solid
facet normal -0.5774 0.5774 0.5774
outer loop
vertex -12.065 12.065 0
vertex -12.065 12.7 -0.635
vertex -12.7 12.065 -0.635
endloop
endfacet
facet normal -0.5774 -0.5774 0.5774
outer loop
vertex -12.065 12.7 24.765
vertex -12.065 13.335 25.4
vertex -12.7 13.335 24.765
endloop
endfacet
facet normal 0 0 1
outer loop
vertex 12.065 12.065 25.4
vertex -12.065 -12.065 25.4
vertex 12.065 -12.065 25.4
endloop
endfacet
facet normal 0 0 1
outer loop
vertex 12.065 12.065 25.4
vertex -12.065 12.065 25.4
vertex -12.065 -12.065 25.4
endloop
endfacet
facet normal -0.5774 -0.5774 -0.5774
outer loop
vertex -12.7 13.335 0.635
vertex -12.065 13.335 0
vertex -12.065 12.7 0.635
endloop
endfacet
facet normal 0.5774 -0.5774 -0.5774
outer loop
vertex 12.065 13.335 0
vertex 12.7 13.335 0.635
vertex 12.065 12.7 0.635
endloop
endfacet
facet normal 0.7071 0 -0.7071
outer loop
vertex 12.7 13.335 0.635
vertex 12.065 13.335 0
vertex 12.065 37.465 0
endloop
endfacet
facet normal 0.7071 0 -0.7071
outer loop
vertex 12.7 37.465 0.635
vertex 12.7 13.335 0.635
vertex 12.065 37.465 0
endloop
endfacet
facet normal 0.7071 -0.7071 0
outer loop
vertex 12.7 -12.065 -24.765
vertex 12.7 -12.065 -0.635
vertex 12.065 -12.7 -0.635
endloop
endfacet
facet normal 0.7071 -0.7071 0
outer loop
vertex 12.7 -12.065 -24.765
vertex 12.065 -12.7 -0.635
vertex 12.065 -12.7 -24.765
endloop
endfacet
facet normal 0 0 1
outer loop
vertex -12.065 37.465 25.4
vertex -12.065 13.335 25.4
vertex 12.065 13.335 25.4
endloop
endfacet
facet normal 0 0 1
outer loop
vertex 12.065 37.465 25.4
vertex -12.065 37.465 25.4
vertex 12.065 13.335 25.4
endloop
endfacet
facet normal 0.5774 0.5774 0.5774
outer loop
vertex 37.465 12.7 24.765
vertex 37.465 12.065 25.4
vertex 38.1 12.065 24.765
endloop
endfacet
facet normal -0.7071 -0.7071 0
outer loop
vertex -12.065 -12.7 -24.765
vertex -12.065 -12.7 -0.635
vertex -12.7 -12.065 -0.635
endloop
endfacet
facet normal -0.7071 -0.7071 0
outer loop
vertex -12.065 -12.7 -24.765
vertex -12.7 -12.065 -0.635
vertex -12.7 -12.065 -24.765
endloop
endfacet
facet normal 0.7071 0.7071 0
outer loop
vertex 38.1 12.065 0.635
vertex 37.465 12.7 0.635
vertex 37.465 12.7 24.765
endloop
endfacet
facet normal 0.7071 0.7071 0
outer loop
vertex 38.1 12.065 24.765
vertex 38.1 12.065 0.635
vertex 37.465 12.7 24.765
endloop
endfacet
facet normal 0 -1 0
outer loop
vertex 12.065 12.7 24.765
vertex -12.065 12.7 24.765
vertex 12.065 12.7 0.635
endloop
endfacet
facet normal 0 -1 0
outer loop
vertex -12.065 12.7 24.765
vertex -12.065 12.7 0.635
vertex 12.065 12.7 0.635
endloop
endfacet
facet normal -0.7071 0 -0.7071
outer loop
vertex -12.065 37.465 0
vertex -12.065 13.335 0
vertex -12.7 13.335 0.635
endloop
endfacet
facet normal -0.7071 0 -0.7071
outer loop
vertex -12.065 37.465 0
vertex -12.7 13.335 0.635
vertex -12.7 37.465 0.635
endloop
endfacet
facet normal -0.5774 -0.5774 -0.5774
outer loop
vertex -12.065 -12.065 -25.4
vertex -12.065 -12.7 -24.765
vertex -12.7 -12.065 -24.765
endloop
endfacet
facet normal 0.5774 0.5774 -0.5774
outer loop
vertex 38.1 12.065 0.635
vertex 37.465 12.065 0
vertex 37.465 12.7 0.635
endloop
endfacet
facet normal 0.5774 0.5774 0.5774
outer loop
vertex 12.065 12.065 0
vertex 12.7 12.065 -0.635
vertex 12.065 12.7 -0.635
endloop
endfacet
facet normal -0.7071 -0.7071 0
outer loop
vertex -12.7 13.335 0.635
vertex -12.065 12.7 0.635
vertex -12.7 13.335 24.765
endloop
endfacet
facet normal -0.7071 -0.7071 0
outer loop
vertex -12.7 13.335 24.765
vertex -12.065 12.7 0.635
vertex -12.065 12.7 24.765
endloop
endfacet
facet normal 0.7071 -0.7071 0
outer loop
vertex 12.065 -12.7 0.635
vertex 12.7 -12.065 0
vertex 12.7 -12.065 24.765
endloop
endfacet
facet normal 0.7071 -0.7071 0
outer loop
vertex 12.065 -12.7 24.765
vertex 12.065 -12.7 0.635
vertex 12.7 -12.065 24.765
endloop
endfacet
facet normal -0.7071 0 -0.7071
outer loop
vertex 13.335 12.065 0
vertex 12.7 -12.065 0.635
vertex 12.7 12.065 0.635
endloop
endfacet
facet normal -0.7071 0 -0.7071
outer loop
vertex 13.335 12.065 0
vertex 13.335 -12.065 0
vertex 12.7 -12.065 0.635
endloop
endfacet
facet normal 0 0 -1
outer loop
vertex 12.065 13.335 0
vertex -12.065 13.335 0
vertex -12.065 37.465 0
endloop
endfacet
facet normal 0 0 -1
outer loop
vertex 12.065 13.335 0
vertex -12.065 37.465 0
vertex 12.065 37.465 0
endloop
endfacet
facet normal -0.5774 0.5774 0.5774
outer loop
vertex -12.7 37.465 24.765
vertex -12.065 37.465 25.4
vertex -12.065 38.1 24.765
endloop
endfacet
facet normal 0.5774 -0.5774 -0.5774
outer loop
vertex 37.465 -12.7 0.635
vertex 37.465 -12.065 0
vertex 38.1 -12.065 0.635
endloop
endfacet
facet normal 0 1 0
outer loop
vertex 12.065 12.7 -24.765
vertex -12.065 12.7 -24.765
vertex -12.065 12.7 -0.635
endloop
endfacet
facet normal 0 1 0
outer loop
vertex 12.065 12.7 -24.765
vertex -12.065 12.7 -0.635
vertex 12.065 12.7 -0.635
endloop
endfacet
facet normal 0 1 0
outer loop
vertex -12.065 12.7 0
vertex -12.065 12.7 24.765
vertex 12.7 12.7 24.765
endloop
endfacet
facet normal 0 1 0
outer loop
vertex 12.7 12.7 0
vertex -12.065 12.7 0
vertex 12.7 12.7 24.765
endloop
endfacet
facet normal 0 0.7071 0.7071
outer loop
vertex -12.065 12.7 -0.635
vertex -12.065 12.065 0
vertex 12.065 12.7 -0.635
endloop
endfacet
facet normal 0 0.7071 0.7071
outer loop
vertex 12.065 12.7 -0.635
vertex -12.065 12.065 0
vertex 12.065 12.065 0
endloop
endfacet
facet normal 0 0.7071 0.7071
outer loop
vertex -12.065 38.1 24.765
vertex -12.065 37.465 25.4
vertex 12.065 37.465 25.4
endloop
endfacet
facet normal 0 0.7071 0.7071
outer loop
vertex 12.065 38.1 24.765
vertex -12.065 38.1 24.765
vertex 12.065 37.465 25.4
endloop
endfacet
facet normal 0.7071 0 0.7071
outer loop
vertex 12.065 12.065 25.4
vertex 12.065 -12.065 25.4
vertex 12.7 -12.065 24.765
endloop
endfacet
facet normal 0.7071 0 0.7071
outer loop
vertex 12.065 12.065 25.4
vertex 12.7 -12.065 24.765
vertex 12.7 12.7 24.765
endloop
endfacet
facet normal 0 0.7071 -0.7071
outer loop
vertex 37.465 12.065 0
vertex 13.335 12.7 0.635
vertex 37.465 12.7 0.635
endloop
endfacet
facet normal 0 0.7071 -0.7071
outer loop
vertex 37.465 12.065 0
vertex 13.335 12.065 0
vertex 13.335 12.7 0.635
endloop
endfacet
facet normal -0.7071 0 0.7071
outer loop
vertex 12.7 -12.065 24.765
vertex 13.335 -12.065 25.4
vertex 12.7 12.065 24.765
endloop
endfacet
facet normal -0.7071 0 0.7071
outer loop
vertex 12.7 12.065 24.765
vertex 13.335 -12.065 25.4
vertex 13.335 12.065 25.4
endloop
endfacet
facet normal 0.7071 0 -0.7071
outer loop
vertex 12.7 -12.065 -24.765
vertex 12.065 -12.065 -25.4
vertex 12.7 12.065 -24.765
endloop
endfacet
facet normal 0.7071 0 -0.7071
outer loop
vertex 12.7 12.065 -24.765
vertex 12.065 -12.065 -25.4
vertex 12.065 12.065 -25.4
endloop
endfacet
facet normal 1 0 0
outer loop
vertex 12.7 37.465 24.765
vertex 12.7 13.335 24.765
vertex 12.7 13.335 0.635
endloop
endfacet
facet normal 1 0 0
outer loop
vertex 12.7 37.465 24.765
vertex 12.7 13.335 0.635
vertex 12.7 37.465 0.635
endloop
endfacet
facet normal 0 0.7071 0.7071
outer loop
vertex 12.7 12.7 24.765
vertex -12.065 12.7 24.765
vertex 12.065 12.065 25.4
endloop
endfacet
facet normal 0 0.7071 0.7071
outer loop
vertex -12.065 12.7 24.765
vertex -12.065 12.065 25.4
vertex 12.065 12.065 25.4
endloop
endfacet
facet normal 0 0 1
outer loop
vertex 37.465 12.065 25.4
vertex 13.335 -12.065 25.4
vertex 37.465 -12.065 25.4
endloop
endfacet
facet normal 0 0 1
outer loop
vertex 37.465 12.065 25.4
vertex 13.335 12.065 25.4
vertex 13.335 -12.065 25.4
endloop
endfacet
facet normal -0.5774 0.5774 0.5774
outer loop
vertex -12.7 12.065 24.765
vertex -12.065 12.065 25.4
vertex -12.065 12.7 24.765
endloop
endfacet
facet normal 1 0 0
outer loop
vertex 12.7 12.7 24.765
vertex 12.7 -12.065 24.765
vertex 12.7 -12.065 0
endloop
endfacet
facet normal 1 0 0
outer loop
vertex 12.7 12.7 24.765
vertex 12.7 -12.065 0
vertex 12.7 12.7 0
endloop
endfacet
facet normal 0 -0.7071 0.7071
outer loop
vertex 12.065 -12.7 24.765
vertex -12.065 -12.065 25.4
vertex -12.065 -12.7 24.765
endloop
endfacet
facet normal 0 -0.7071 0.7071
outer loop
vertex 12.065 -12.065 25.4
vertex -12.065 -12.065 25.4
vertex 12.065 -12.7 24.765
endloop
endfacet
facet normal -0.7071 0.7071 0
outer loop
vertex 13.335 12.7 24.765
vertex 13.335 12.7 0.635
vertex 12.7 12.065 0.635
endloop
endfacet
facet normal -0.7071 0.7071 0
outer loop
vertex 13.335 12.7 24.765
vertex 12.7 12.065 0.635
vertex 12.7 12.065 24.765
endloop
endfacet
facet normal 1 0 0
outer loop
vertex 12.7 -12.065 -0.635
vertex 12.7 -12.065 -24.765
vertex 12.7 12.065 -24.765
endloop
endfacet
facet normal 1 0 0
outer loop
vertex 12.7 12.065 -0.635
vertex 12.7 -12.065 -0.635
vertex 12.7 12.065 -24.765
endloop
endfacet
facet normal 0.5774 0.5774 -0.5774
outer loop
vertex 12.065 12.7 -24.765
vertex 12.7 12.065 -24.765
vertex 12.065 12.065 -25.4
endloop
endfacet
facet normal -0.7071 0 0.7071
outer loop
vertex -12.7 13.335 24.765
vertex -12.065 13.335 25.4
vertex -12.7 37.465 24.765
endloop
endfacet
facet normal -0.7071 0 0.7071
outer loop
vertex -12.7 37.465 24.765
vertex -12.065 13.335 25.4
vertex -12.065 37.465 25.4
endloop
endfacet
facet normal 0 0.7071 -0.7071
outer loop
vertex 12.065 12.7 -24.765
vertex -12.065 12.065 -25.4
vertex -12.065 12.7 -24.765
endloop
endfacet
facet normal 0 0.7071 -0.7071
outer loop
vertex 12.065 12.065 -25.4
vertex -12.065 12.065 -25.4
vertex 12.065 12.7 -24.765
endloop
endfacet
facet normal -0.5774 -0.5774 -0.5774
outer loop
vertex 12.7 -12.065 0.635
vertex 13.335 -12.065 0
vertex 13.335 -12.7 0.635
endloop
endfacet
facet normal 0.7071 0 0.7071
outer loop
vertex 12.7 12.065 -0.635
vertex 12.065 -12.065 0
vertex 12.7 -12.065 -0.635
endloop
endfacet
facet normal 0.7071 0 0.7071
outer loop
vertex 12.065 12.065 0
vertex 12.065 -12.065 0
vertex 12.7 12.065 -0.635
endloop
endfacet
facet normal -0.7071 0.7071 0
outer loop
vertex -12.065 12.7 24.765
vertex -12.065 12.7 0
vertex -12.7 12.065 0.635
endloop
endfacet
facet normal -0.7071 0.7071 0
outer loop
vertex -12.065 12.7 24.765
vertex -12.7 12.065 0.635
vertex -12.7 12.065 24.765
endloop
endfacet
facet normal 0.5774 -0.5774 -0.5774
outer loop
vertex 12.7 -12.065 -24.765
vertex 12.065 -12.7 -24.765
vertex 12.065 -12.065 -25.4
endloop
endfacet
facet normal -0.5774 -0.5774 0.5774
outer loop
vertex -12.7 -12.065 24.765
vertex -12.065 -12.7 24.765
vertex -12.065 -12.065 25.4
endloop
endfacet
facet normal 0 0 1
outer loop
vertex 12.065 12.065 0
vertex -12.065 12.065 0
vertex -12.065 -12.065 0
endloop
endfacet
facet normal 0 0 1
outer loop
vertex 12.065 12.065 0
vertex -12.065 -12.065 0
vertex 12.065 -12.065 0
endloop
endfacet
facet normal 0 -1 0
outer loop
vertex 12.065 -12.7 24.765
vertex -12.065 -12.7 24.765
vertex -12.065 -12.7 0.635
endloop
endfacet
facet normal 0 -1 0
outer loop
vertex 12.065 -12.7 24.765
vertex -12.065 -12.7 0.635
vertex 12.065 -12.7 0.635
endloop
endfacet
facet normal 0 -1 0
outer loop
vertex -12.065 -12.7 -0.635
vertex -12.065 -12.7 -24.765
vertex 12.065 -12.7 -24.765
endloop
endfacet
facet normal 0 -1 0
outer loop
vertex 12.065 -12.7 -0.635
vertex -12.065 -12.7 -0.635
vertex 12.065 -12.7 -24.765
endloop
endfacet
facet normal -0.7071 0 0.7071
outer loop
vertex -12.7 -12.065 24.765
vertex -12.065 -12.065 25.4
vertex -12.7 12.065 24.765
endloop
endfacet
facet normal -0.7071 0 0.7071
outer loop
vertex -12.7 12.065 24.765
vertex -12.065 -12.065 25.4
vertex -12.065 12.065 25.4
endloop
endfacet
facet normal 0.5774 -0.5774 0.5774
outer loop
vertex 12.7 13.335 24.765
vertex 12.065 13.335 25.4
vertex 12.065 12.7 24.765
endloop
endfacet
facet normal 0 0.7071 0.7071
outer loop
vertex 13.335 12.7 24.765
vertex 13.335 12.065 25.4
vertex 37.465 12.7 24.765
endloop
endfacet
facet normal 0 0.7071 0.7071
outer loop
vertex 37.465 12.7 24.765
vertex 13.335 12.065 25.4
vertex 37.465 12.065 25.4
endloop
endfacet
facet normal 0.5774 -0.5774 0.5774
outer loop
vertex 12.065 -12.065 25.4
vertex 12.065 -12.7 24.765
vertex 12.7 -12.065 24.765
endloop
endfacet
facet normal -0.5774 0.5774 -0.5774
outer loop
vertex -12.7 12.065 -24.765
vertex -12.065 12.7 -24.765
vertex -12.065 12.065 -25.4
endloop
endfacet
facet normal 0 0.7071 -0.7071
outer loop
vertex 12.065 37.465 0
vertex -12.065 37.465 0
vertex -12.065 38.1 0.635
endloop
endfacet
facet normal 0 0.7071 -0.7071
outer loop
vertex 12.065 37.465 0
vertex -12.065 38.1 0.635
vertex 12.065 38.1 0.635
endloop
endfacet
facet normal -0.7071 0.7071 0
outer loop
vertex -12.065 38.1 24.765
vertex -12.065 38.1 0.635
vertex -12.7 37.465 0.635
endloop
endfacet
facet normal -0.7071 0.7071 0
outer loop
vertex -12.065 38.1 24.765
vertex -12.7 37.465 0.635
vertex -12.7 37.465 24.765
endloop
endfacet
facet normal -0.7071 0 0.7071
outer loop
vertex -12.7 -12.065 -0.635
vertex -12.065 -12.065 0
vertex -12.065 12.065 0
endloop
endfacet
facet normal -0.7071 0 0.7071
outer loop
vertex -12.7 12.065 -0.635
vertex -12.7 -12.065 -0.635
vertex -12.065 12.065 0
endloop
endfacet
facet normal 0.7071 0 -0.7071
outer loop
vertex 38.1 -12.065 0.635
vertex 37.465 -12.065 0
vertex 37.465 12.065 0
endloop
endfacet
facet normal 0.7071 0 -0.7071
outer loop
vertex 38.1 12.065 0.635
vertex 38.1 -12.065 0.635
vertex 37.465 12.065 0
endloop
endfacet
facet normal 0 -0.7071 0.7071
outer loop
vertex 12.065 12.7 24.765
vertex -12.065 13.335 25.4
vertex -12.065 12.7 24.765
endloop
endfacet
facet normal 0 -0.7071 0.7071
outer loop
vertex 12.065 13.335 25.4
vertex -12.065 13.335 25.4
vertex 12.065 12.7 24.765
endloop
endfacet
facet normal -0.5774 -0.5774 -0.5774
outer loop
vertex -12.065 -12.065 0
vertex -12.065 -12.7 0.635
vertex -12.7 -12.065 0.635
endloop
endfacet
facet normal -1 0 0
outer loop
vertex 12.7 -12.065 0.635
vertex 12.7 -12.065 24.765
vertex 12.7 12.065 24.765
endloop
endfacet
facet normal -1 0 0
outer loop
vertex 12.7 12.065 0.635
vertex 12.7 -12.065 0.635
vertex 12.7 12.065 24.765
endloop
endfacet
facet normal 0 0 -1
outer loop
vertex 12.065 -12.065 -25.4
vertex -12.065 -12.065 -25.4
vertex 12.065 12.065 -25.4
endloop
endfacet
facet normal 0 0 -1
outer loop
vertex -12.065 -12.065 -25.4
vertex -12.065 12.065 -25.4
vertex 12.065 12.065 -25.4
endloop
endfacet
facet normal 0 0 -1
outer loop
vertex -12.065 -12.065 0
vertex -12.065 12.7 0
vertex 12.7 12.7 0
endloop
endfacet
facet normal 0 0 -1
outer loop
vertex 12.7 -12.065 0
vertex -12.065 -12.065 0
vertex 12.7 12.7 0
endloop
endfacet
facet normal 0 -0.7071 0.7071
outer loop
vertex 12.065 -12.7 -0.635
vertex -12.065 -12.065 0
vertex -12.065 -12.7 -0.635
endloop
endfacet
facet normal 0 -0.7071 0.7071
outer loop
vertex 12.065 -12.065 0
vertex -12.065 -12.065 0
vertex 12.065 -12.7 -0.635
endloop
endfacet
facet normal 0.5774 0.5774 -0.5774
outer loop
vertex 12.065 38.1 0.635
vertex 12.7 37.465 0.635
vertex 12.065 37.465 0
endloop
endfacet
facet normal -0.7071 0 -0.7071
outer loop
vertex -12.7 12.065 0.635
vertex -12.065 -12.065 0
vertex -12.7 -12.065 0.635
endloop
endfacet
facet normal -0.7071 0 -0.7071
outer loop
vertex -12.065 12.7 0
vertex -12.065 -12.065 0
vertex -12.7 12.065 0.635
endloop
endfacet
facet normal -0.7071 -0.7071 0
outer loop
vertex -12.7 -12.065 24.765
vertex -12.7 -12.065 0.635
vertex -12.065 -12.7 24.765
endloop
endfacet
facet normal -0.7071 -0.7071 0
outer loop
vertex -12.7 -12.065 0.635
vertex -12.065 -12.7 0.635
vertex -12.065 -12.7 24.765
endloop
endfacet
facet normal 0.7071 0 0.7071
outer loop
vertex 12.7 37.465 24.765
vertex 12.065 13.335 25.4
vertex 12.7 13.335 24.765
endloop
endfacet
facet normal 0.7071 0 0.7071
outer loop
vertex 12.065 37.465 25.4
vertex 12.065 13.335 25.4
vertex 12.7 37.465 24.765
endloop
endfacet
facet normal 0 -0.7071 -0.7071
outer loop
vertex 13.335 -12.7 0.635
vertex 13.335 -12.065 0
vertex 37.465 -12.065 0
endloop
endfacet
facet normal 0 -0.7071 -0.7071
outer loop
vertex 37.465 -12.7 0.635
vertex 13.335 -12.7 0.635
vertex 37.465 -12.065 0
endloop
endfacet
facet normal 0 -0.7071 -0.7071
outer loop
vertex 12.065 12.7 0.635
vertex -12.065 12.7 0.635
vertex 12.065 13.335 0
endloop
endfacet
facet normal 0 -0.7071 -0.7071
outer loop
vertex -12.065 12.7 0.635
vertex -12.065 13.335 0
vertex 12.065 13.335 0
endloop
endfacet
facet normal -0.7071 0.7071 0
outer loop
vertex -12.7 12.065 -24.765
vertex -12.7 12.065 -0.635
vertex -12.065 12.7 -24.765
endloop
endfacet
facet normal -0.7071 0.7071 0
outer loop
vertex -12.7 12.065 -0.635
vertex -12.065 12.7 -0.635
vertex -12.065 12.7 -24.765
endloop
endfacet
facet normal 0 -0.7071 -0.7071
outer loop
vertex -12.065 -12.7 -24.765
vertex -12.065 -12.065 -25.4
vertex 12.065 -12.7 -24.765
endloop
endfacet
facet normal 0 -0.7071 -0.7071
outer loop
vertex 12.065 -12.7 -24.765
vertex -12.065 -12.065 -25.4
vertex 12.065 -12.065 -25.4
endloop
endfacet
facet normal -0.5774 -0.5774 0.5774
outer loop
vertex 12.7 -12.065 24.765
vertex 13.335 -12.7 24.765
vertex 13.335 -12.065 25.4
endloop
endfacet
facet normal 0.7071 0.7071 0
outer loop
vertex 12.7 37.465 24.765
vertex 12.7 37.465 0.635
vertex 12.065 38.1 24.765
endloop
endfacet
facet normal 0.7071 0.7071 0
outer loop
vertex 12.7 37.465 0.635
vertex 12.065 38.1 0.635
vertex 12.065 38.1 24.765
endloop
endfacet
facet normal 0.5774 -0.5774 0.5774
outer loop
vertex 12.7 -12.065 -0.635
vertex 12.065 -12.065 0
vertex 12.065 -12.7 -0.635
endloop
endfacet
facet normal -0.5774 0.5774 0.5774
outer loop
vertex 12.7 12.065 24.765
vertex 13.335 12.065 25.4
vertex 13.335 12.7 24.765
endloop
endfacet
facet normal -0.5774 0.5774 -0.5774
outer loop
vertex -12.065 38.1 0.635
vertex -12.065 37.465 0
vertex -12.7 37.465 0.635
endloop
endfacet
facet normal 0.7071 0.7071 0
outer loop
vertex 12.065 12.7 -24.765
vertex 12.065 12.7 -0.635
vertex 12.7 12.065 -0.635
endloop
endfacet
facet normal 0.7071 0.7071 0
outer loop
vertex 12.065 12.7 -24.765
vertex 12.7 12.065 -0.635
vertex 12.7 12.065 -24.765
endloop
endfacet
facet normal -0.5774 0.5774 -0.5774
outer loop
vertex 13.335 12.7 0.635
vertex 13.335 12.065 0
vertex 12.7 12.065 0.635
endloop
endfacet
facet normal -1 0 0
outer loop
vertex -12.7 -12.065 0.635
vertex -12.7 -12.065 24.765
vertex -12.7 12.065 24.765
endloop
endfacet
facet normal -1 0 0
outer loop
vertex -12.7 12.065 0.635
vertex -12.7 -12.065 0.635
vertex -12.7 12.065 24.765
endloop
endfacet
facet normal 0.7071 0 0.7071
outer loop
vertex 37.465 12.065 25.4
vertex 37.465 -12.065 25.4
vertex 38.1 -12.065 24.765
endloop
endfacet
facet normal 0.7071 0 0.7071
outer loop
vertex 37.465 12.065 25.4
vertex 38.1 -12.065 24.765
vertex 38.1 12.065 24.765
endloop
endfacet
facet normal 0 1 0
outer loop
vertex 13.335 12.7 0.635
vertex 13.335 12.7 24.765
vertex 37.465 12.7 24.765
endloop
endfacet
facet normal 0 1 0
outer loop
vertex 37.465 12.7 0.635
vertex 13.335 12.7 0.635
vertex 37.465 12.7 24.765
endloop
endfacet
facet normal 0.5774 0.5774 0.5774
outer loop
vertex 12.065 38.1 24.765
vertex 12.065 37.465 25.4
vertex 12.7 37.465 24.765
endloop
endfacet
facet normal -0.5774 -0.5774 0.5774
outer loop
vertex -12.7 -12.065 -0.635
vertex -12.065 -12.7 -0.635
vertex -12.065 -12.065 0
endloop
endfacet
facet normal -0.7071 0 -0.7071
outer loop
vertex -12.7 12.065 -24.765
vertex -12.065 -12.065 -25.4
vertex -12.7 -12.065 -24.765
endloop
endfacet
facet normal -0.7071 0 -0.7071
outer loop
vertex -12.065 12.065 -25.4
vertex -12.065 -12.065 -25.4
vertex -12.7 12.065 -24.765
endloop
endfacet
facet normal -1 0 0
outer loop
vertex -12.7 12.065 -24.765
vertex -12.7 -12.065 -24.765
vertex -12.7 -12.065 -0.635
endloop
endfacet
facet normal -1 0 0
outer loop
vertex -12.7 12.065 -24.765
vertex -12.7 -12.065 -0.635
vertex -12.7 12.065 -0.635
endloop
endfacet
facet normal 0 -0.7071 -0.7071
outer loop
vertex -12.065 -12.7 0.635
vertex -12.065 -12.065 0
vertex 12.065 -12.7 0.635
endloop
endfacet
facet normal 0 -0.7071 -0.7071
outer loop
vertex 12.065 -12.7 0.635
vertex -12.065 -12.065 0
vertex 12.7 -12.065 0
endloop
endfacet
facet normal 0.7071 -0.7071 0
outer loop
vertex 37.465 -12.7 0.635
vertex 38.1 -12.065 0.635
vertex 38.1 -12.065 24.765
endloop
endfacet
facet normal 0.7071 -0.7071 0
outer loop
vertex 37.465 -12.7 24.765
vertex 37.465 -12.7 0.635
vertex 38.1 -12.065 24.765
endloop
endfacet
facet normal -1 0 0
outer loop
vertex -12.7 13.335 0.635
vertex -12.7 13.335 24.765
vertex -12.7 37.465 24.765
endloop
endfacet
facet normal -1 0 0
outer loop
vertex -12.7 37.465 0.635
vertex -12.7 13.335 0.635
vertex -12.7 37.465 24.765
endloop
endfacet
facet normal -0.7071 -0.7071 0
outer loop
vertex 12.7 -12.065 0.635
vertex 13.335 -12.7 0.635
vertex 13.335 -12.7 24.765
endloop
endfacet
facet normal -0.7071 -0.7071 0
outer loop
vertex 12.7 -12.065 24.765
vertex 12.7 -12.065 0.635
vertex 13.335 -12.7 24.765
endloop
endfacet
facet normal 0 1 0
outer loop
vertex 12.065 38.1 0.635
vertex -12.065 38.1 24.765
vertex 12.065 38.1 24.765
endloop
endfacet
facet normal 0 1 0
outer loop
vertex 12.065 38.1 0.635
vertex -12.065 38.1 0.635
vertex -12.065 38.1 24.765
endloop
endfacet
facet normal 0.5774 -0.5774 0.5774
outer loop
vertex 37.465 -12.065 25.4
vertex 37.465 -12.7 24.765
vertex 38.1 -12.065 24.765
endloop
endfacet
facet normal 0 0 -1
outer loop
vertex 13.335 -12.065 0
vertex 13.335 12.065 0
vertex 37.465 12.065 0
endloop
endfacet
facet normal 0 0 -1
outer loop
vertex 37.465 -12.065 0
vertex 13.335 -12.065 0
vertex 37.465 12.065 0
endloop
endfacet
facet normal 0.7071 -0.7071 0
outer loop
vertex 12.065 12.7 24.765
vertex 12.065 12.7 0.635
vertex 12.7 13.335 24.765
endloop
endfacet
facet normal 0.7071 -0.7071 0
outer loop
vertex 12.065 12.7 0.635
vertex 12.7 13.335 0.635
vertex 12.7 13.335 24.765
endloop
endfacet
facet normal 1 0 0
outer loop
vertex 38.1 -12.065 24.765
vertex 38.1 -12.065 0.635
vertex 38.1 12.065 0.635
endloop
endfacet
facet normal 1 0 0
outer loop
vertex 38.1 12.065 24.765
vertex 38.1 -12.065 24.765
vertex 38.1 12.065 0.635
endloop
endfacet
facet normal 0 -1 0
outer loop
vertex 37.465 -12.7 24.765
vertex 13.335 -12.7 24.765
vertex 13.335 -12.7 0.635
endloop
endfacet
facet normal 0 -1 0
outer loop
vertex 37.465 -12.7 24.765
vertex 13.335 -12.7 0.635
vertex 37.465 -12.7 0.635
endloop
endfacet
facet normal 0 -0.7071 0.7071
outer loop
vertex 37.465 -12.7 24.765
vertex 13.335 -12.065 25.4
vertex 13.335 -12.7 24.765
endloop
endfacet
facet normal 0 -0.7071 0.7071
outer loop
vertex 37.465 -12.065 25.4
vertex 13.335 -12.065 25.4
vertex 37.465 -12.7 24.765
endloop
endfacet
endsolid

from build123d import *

# Parameters (mm, degrees)
F0_W      = 25.4
F0_H      = 25.4
F1_DEPTH  = 25.4
F2_DEPTH  = 25.4
F3_DEPTH  = 25.4
F4_DEPTH  = 25.4
F5_SIZE   = 0.635
F5_2_SIZE = 0.635
F5_3_SIZE = 0.635
F5_4_SIZE = 0.635


with BuildPart() as f1:
    # F0 (on Top) → F1 (new body)
    with BuildSketch(Plane.XY):
        with Locations((25.4, 0)):
            Rectangle(F0_W, F0_H)
    extrude(amount=F1_DEPTH)

    # F5
    f5_edges = [f1.edges().sort_by_distance(p)[0] for p in [
        (25.4, 12.7, 0),
        (12.7, 0, 0),
        (25.4, -12.7, 0),
        (38.1, 0, 0),
        (12.7, -12.7, 12.7),
        (38.1, -12.7, 12.7),
        (25.4, -12.7, 25.4),
        (25.4, 12.7, 25.4),
        (12.7, 0, 25.4),
        (38.1, 0, 25.4),
        (12.7, 12.7, 12.7),
        (38.1, 12.7, 12.7),
    ]]
    chamfer(f5_edges, length=F5_SIZE)


with BuildPart() as f2:
    # F0 (on Top) → F2 (new body)
    with BuildSketch(Plane.XY):
        Rectangle(F0_W, F0_H)
    extrude(amount=F2_DEPTH)

    # F5#3
    f5_3_edges = [f2.edges().sort_by_distance(p)[0] for p in [
        (12.7, -12.7, 12.7),
        (-12.7, -12.7, 12.7),
        (0, -12.7, 0),
        (0, -12.7, 25.4),
        (12.7, 0, 25.4),
        (0, 12.7, 25.4),
        (-12.7, 0, 25.4),
        (-12.7, 12.7, 12.7),
        (-12.7, 0, 0),
    ]]
    chamfer(f5_3_edges, length=F5_3_SIZE)


with BuildPart() as f3:
    # F0 (on Top) → F3 (new body)
    with BuildSketch(Plane.XY):
        with Locations((0, 25.4)):
            Rectangle(F0_W, F0_H)
    extrude(amount=F3_DEPTH)

    # F5#4
    f5_4_edges = [f3.edges().sort_by_distance(p)[0] for p in [
        (0, 12.7, 25.4),
        (-12.7, 25.4, 25.4),
        (12.7, 25.4, 25.4),
        (0, 38.1, 25.4),
        (12.7, 12.7, 12.7),
        (12.7, 38.1, 12.7),
        (12.7, 25.4, 0),
        (0, 12.7, 0),
        (-12.7, 25.4, 0),
        (0, 38.1, 0),
        (-12.7, 38.1, 12.7),
        (-12.7, 12.7, 12.7),
    ]]
    chamfer(f5_4_edges, length=F5_4_SIZE)


with BuildPart() as f4:
    # F0 (on Top) → F4 (new body)
    with BuildSketch(Plane.XY):
        Rectangle(F0_W, F0_H)
    extrude(amount=-F4_DEPTH)

    # F5#2
    f5_2_edges = [f4.edges().sort_by_distance(p)[0] for p in [
        (12.7, 0, 0),
        (0, -12.7, 0),
        (-12.7, -12.7, -12.7),
        (12.7, -12.7, -12.7),
        (0, -12.7, -25.4),
        (12.7, 12.7, -12.7),
        (12.7, 0, -25.4),
        (-12.7, 12.7, -12.7),
        (0, 12.7, 0),
        (0, 12.7, -25.4),
        (-12.7, 0, 0),
        (-12.7, 0, -25.4),
    ]]
    chamfer(f5_2_edges, length=F5_2_SIZE)


solid = Compound([f1.part, f2.part, f3.part, f4.part])
